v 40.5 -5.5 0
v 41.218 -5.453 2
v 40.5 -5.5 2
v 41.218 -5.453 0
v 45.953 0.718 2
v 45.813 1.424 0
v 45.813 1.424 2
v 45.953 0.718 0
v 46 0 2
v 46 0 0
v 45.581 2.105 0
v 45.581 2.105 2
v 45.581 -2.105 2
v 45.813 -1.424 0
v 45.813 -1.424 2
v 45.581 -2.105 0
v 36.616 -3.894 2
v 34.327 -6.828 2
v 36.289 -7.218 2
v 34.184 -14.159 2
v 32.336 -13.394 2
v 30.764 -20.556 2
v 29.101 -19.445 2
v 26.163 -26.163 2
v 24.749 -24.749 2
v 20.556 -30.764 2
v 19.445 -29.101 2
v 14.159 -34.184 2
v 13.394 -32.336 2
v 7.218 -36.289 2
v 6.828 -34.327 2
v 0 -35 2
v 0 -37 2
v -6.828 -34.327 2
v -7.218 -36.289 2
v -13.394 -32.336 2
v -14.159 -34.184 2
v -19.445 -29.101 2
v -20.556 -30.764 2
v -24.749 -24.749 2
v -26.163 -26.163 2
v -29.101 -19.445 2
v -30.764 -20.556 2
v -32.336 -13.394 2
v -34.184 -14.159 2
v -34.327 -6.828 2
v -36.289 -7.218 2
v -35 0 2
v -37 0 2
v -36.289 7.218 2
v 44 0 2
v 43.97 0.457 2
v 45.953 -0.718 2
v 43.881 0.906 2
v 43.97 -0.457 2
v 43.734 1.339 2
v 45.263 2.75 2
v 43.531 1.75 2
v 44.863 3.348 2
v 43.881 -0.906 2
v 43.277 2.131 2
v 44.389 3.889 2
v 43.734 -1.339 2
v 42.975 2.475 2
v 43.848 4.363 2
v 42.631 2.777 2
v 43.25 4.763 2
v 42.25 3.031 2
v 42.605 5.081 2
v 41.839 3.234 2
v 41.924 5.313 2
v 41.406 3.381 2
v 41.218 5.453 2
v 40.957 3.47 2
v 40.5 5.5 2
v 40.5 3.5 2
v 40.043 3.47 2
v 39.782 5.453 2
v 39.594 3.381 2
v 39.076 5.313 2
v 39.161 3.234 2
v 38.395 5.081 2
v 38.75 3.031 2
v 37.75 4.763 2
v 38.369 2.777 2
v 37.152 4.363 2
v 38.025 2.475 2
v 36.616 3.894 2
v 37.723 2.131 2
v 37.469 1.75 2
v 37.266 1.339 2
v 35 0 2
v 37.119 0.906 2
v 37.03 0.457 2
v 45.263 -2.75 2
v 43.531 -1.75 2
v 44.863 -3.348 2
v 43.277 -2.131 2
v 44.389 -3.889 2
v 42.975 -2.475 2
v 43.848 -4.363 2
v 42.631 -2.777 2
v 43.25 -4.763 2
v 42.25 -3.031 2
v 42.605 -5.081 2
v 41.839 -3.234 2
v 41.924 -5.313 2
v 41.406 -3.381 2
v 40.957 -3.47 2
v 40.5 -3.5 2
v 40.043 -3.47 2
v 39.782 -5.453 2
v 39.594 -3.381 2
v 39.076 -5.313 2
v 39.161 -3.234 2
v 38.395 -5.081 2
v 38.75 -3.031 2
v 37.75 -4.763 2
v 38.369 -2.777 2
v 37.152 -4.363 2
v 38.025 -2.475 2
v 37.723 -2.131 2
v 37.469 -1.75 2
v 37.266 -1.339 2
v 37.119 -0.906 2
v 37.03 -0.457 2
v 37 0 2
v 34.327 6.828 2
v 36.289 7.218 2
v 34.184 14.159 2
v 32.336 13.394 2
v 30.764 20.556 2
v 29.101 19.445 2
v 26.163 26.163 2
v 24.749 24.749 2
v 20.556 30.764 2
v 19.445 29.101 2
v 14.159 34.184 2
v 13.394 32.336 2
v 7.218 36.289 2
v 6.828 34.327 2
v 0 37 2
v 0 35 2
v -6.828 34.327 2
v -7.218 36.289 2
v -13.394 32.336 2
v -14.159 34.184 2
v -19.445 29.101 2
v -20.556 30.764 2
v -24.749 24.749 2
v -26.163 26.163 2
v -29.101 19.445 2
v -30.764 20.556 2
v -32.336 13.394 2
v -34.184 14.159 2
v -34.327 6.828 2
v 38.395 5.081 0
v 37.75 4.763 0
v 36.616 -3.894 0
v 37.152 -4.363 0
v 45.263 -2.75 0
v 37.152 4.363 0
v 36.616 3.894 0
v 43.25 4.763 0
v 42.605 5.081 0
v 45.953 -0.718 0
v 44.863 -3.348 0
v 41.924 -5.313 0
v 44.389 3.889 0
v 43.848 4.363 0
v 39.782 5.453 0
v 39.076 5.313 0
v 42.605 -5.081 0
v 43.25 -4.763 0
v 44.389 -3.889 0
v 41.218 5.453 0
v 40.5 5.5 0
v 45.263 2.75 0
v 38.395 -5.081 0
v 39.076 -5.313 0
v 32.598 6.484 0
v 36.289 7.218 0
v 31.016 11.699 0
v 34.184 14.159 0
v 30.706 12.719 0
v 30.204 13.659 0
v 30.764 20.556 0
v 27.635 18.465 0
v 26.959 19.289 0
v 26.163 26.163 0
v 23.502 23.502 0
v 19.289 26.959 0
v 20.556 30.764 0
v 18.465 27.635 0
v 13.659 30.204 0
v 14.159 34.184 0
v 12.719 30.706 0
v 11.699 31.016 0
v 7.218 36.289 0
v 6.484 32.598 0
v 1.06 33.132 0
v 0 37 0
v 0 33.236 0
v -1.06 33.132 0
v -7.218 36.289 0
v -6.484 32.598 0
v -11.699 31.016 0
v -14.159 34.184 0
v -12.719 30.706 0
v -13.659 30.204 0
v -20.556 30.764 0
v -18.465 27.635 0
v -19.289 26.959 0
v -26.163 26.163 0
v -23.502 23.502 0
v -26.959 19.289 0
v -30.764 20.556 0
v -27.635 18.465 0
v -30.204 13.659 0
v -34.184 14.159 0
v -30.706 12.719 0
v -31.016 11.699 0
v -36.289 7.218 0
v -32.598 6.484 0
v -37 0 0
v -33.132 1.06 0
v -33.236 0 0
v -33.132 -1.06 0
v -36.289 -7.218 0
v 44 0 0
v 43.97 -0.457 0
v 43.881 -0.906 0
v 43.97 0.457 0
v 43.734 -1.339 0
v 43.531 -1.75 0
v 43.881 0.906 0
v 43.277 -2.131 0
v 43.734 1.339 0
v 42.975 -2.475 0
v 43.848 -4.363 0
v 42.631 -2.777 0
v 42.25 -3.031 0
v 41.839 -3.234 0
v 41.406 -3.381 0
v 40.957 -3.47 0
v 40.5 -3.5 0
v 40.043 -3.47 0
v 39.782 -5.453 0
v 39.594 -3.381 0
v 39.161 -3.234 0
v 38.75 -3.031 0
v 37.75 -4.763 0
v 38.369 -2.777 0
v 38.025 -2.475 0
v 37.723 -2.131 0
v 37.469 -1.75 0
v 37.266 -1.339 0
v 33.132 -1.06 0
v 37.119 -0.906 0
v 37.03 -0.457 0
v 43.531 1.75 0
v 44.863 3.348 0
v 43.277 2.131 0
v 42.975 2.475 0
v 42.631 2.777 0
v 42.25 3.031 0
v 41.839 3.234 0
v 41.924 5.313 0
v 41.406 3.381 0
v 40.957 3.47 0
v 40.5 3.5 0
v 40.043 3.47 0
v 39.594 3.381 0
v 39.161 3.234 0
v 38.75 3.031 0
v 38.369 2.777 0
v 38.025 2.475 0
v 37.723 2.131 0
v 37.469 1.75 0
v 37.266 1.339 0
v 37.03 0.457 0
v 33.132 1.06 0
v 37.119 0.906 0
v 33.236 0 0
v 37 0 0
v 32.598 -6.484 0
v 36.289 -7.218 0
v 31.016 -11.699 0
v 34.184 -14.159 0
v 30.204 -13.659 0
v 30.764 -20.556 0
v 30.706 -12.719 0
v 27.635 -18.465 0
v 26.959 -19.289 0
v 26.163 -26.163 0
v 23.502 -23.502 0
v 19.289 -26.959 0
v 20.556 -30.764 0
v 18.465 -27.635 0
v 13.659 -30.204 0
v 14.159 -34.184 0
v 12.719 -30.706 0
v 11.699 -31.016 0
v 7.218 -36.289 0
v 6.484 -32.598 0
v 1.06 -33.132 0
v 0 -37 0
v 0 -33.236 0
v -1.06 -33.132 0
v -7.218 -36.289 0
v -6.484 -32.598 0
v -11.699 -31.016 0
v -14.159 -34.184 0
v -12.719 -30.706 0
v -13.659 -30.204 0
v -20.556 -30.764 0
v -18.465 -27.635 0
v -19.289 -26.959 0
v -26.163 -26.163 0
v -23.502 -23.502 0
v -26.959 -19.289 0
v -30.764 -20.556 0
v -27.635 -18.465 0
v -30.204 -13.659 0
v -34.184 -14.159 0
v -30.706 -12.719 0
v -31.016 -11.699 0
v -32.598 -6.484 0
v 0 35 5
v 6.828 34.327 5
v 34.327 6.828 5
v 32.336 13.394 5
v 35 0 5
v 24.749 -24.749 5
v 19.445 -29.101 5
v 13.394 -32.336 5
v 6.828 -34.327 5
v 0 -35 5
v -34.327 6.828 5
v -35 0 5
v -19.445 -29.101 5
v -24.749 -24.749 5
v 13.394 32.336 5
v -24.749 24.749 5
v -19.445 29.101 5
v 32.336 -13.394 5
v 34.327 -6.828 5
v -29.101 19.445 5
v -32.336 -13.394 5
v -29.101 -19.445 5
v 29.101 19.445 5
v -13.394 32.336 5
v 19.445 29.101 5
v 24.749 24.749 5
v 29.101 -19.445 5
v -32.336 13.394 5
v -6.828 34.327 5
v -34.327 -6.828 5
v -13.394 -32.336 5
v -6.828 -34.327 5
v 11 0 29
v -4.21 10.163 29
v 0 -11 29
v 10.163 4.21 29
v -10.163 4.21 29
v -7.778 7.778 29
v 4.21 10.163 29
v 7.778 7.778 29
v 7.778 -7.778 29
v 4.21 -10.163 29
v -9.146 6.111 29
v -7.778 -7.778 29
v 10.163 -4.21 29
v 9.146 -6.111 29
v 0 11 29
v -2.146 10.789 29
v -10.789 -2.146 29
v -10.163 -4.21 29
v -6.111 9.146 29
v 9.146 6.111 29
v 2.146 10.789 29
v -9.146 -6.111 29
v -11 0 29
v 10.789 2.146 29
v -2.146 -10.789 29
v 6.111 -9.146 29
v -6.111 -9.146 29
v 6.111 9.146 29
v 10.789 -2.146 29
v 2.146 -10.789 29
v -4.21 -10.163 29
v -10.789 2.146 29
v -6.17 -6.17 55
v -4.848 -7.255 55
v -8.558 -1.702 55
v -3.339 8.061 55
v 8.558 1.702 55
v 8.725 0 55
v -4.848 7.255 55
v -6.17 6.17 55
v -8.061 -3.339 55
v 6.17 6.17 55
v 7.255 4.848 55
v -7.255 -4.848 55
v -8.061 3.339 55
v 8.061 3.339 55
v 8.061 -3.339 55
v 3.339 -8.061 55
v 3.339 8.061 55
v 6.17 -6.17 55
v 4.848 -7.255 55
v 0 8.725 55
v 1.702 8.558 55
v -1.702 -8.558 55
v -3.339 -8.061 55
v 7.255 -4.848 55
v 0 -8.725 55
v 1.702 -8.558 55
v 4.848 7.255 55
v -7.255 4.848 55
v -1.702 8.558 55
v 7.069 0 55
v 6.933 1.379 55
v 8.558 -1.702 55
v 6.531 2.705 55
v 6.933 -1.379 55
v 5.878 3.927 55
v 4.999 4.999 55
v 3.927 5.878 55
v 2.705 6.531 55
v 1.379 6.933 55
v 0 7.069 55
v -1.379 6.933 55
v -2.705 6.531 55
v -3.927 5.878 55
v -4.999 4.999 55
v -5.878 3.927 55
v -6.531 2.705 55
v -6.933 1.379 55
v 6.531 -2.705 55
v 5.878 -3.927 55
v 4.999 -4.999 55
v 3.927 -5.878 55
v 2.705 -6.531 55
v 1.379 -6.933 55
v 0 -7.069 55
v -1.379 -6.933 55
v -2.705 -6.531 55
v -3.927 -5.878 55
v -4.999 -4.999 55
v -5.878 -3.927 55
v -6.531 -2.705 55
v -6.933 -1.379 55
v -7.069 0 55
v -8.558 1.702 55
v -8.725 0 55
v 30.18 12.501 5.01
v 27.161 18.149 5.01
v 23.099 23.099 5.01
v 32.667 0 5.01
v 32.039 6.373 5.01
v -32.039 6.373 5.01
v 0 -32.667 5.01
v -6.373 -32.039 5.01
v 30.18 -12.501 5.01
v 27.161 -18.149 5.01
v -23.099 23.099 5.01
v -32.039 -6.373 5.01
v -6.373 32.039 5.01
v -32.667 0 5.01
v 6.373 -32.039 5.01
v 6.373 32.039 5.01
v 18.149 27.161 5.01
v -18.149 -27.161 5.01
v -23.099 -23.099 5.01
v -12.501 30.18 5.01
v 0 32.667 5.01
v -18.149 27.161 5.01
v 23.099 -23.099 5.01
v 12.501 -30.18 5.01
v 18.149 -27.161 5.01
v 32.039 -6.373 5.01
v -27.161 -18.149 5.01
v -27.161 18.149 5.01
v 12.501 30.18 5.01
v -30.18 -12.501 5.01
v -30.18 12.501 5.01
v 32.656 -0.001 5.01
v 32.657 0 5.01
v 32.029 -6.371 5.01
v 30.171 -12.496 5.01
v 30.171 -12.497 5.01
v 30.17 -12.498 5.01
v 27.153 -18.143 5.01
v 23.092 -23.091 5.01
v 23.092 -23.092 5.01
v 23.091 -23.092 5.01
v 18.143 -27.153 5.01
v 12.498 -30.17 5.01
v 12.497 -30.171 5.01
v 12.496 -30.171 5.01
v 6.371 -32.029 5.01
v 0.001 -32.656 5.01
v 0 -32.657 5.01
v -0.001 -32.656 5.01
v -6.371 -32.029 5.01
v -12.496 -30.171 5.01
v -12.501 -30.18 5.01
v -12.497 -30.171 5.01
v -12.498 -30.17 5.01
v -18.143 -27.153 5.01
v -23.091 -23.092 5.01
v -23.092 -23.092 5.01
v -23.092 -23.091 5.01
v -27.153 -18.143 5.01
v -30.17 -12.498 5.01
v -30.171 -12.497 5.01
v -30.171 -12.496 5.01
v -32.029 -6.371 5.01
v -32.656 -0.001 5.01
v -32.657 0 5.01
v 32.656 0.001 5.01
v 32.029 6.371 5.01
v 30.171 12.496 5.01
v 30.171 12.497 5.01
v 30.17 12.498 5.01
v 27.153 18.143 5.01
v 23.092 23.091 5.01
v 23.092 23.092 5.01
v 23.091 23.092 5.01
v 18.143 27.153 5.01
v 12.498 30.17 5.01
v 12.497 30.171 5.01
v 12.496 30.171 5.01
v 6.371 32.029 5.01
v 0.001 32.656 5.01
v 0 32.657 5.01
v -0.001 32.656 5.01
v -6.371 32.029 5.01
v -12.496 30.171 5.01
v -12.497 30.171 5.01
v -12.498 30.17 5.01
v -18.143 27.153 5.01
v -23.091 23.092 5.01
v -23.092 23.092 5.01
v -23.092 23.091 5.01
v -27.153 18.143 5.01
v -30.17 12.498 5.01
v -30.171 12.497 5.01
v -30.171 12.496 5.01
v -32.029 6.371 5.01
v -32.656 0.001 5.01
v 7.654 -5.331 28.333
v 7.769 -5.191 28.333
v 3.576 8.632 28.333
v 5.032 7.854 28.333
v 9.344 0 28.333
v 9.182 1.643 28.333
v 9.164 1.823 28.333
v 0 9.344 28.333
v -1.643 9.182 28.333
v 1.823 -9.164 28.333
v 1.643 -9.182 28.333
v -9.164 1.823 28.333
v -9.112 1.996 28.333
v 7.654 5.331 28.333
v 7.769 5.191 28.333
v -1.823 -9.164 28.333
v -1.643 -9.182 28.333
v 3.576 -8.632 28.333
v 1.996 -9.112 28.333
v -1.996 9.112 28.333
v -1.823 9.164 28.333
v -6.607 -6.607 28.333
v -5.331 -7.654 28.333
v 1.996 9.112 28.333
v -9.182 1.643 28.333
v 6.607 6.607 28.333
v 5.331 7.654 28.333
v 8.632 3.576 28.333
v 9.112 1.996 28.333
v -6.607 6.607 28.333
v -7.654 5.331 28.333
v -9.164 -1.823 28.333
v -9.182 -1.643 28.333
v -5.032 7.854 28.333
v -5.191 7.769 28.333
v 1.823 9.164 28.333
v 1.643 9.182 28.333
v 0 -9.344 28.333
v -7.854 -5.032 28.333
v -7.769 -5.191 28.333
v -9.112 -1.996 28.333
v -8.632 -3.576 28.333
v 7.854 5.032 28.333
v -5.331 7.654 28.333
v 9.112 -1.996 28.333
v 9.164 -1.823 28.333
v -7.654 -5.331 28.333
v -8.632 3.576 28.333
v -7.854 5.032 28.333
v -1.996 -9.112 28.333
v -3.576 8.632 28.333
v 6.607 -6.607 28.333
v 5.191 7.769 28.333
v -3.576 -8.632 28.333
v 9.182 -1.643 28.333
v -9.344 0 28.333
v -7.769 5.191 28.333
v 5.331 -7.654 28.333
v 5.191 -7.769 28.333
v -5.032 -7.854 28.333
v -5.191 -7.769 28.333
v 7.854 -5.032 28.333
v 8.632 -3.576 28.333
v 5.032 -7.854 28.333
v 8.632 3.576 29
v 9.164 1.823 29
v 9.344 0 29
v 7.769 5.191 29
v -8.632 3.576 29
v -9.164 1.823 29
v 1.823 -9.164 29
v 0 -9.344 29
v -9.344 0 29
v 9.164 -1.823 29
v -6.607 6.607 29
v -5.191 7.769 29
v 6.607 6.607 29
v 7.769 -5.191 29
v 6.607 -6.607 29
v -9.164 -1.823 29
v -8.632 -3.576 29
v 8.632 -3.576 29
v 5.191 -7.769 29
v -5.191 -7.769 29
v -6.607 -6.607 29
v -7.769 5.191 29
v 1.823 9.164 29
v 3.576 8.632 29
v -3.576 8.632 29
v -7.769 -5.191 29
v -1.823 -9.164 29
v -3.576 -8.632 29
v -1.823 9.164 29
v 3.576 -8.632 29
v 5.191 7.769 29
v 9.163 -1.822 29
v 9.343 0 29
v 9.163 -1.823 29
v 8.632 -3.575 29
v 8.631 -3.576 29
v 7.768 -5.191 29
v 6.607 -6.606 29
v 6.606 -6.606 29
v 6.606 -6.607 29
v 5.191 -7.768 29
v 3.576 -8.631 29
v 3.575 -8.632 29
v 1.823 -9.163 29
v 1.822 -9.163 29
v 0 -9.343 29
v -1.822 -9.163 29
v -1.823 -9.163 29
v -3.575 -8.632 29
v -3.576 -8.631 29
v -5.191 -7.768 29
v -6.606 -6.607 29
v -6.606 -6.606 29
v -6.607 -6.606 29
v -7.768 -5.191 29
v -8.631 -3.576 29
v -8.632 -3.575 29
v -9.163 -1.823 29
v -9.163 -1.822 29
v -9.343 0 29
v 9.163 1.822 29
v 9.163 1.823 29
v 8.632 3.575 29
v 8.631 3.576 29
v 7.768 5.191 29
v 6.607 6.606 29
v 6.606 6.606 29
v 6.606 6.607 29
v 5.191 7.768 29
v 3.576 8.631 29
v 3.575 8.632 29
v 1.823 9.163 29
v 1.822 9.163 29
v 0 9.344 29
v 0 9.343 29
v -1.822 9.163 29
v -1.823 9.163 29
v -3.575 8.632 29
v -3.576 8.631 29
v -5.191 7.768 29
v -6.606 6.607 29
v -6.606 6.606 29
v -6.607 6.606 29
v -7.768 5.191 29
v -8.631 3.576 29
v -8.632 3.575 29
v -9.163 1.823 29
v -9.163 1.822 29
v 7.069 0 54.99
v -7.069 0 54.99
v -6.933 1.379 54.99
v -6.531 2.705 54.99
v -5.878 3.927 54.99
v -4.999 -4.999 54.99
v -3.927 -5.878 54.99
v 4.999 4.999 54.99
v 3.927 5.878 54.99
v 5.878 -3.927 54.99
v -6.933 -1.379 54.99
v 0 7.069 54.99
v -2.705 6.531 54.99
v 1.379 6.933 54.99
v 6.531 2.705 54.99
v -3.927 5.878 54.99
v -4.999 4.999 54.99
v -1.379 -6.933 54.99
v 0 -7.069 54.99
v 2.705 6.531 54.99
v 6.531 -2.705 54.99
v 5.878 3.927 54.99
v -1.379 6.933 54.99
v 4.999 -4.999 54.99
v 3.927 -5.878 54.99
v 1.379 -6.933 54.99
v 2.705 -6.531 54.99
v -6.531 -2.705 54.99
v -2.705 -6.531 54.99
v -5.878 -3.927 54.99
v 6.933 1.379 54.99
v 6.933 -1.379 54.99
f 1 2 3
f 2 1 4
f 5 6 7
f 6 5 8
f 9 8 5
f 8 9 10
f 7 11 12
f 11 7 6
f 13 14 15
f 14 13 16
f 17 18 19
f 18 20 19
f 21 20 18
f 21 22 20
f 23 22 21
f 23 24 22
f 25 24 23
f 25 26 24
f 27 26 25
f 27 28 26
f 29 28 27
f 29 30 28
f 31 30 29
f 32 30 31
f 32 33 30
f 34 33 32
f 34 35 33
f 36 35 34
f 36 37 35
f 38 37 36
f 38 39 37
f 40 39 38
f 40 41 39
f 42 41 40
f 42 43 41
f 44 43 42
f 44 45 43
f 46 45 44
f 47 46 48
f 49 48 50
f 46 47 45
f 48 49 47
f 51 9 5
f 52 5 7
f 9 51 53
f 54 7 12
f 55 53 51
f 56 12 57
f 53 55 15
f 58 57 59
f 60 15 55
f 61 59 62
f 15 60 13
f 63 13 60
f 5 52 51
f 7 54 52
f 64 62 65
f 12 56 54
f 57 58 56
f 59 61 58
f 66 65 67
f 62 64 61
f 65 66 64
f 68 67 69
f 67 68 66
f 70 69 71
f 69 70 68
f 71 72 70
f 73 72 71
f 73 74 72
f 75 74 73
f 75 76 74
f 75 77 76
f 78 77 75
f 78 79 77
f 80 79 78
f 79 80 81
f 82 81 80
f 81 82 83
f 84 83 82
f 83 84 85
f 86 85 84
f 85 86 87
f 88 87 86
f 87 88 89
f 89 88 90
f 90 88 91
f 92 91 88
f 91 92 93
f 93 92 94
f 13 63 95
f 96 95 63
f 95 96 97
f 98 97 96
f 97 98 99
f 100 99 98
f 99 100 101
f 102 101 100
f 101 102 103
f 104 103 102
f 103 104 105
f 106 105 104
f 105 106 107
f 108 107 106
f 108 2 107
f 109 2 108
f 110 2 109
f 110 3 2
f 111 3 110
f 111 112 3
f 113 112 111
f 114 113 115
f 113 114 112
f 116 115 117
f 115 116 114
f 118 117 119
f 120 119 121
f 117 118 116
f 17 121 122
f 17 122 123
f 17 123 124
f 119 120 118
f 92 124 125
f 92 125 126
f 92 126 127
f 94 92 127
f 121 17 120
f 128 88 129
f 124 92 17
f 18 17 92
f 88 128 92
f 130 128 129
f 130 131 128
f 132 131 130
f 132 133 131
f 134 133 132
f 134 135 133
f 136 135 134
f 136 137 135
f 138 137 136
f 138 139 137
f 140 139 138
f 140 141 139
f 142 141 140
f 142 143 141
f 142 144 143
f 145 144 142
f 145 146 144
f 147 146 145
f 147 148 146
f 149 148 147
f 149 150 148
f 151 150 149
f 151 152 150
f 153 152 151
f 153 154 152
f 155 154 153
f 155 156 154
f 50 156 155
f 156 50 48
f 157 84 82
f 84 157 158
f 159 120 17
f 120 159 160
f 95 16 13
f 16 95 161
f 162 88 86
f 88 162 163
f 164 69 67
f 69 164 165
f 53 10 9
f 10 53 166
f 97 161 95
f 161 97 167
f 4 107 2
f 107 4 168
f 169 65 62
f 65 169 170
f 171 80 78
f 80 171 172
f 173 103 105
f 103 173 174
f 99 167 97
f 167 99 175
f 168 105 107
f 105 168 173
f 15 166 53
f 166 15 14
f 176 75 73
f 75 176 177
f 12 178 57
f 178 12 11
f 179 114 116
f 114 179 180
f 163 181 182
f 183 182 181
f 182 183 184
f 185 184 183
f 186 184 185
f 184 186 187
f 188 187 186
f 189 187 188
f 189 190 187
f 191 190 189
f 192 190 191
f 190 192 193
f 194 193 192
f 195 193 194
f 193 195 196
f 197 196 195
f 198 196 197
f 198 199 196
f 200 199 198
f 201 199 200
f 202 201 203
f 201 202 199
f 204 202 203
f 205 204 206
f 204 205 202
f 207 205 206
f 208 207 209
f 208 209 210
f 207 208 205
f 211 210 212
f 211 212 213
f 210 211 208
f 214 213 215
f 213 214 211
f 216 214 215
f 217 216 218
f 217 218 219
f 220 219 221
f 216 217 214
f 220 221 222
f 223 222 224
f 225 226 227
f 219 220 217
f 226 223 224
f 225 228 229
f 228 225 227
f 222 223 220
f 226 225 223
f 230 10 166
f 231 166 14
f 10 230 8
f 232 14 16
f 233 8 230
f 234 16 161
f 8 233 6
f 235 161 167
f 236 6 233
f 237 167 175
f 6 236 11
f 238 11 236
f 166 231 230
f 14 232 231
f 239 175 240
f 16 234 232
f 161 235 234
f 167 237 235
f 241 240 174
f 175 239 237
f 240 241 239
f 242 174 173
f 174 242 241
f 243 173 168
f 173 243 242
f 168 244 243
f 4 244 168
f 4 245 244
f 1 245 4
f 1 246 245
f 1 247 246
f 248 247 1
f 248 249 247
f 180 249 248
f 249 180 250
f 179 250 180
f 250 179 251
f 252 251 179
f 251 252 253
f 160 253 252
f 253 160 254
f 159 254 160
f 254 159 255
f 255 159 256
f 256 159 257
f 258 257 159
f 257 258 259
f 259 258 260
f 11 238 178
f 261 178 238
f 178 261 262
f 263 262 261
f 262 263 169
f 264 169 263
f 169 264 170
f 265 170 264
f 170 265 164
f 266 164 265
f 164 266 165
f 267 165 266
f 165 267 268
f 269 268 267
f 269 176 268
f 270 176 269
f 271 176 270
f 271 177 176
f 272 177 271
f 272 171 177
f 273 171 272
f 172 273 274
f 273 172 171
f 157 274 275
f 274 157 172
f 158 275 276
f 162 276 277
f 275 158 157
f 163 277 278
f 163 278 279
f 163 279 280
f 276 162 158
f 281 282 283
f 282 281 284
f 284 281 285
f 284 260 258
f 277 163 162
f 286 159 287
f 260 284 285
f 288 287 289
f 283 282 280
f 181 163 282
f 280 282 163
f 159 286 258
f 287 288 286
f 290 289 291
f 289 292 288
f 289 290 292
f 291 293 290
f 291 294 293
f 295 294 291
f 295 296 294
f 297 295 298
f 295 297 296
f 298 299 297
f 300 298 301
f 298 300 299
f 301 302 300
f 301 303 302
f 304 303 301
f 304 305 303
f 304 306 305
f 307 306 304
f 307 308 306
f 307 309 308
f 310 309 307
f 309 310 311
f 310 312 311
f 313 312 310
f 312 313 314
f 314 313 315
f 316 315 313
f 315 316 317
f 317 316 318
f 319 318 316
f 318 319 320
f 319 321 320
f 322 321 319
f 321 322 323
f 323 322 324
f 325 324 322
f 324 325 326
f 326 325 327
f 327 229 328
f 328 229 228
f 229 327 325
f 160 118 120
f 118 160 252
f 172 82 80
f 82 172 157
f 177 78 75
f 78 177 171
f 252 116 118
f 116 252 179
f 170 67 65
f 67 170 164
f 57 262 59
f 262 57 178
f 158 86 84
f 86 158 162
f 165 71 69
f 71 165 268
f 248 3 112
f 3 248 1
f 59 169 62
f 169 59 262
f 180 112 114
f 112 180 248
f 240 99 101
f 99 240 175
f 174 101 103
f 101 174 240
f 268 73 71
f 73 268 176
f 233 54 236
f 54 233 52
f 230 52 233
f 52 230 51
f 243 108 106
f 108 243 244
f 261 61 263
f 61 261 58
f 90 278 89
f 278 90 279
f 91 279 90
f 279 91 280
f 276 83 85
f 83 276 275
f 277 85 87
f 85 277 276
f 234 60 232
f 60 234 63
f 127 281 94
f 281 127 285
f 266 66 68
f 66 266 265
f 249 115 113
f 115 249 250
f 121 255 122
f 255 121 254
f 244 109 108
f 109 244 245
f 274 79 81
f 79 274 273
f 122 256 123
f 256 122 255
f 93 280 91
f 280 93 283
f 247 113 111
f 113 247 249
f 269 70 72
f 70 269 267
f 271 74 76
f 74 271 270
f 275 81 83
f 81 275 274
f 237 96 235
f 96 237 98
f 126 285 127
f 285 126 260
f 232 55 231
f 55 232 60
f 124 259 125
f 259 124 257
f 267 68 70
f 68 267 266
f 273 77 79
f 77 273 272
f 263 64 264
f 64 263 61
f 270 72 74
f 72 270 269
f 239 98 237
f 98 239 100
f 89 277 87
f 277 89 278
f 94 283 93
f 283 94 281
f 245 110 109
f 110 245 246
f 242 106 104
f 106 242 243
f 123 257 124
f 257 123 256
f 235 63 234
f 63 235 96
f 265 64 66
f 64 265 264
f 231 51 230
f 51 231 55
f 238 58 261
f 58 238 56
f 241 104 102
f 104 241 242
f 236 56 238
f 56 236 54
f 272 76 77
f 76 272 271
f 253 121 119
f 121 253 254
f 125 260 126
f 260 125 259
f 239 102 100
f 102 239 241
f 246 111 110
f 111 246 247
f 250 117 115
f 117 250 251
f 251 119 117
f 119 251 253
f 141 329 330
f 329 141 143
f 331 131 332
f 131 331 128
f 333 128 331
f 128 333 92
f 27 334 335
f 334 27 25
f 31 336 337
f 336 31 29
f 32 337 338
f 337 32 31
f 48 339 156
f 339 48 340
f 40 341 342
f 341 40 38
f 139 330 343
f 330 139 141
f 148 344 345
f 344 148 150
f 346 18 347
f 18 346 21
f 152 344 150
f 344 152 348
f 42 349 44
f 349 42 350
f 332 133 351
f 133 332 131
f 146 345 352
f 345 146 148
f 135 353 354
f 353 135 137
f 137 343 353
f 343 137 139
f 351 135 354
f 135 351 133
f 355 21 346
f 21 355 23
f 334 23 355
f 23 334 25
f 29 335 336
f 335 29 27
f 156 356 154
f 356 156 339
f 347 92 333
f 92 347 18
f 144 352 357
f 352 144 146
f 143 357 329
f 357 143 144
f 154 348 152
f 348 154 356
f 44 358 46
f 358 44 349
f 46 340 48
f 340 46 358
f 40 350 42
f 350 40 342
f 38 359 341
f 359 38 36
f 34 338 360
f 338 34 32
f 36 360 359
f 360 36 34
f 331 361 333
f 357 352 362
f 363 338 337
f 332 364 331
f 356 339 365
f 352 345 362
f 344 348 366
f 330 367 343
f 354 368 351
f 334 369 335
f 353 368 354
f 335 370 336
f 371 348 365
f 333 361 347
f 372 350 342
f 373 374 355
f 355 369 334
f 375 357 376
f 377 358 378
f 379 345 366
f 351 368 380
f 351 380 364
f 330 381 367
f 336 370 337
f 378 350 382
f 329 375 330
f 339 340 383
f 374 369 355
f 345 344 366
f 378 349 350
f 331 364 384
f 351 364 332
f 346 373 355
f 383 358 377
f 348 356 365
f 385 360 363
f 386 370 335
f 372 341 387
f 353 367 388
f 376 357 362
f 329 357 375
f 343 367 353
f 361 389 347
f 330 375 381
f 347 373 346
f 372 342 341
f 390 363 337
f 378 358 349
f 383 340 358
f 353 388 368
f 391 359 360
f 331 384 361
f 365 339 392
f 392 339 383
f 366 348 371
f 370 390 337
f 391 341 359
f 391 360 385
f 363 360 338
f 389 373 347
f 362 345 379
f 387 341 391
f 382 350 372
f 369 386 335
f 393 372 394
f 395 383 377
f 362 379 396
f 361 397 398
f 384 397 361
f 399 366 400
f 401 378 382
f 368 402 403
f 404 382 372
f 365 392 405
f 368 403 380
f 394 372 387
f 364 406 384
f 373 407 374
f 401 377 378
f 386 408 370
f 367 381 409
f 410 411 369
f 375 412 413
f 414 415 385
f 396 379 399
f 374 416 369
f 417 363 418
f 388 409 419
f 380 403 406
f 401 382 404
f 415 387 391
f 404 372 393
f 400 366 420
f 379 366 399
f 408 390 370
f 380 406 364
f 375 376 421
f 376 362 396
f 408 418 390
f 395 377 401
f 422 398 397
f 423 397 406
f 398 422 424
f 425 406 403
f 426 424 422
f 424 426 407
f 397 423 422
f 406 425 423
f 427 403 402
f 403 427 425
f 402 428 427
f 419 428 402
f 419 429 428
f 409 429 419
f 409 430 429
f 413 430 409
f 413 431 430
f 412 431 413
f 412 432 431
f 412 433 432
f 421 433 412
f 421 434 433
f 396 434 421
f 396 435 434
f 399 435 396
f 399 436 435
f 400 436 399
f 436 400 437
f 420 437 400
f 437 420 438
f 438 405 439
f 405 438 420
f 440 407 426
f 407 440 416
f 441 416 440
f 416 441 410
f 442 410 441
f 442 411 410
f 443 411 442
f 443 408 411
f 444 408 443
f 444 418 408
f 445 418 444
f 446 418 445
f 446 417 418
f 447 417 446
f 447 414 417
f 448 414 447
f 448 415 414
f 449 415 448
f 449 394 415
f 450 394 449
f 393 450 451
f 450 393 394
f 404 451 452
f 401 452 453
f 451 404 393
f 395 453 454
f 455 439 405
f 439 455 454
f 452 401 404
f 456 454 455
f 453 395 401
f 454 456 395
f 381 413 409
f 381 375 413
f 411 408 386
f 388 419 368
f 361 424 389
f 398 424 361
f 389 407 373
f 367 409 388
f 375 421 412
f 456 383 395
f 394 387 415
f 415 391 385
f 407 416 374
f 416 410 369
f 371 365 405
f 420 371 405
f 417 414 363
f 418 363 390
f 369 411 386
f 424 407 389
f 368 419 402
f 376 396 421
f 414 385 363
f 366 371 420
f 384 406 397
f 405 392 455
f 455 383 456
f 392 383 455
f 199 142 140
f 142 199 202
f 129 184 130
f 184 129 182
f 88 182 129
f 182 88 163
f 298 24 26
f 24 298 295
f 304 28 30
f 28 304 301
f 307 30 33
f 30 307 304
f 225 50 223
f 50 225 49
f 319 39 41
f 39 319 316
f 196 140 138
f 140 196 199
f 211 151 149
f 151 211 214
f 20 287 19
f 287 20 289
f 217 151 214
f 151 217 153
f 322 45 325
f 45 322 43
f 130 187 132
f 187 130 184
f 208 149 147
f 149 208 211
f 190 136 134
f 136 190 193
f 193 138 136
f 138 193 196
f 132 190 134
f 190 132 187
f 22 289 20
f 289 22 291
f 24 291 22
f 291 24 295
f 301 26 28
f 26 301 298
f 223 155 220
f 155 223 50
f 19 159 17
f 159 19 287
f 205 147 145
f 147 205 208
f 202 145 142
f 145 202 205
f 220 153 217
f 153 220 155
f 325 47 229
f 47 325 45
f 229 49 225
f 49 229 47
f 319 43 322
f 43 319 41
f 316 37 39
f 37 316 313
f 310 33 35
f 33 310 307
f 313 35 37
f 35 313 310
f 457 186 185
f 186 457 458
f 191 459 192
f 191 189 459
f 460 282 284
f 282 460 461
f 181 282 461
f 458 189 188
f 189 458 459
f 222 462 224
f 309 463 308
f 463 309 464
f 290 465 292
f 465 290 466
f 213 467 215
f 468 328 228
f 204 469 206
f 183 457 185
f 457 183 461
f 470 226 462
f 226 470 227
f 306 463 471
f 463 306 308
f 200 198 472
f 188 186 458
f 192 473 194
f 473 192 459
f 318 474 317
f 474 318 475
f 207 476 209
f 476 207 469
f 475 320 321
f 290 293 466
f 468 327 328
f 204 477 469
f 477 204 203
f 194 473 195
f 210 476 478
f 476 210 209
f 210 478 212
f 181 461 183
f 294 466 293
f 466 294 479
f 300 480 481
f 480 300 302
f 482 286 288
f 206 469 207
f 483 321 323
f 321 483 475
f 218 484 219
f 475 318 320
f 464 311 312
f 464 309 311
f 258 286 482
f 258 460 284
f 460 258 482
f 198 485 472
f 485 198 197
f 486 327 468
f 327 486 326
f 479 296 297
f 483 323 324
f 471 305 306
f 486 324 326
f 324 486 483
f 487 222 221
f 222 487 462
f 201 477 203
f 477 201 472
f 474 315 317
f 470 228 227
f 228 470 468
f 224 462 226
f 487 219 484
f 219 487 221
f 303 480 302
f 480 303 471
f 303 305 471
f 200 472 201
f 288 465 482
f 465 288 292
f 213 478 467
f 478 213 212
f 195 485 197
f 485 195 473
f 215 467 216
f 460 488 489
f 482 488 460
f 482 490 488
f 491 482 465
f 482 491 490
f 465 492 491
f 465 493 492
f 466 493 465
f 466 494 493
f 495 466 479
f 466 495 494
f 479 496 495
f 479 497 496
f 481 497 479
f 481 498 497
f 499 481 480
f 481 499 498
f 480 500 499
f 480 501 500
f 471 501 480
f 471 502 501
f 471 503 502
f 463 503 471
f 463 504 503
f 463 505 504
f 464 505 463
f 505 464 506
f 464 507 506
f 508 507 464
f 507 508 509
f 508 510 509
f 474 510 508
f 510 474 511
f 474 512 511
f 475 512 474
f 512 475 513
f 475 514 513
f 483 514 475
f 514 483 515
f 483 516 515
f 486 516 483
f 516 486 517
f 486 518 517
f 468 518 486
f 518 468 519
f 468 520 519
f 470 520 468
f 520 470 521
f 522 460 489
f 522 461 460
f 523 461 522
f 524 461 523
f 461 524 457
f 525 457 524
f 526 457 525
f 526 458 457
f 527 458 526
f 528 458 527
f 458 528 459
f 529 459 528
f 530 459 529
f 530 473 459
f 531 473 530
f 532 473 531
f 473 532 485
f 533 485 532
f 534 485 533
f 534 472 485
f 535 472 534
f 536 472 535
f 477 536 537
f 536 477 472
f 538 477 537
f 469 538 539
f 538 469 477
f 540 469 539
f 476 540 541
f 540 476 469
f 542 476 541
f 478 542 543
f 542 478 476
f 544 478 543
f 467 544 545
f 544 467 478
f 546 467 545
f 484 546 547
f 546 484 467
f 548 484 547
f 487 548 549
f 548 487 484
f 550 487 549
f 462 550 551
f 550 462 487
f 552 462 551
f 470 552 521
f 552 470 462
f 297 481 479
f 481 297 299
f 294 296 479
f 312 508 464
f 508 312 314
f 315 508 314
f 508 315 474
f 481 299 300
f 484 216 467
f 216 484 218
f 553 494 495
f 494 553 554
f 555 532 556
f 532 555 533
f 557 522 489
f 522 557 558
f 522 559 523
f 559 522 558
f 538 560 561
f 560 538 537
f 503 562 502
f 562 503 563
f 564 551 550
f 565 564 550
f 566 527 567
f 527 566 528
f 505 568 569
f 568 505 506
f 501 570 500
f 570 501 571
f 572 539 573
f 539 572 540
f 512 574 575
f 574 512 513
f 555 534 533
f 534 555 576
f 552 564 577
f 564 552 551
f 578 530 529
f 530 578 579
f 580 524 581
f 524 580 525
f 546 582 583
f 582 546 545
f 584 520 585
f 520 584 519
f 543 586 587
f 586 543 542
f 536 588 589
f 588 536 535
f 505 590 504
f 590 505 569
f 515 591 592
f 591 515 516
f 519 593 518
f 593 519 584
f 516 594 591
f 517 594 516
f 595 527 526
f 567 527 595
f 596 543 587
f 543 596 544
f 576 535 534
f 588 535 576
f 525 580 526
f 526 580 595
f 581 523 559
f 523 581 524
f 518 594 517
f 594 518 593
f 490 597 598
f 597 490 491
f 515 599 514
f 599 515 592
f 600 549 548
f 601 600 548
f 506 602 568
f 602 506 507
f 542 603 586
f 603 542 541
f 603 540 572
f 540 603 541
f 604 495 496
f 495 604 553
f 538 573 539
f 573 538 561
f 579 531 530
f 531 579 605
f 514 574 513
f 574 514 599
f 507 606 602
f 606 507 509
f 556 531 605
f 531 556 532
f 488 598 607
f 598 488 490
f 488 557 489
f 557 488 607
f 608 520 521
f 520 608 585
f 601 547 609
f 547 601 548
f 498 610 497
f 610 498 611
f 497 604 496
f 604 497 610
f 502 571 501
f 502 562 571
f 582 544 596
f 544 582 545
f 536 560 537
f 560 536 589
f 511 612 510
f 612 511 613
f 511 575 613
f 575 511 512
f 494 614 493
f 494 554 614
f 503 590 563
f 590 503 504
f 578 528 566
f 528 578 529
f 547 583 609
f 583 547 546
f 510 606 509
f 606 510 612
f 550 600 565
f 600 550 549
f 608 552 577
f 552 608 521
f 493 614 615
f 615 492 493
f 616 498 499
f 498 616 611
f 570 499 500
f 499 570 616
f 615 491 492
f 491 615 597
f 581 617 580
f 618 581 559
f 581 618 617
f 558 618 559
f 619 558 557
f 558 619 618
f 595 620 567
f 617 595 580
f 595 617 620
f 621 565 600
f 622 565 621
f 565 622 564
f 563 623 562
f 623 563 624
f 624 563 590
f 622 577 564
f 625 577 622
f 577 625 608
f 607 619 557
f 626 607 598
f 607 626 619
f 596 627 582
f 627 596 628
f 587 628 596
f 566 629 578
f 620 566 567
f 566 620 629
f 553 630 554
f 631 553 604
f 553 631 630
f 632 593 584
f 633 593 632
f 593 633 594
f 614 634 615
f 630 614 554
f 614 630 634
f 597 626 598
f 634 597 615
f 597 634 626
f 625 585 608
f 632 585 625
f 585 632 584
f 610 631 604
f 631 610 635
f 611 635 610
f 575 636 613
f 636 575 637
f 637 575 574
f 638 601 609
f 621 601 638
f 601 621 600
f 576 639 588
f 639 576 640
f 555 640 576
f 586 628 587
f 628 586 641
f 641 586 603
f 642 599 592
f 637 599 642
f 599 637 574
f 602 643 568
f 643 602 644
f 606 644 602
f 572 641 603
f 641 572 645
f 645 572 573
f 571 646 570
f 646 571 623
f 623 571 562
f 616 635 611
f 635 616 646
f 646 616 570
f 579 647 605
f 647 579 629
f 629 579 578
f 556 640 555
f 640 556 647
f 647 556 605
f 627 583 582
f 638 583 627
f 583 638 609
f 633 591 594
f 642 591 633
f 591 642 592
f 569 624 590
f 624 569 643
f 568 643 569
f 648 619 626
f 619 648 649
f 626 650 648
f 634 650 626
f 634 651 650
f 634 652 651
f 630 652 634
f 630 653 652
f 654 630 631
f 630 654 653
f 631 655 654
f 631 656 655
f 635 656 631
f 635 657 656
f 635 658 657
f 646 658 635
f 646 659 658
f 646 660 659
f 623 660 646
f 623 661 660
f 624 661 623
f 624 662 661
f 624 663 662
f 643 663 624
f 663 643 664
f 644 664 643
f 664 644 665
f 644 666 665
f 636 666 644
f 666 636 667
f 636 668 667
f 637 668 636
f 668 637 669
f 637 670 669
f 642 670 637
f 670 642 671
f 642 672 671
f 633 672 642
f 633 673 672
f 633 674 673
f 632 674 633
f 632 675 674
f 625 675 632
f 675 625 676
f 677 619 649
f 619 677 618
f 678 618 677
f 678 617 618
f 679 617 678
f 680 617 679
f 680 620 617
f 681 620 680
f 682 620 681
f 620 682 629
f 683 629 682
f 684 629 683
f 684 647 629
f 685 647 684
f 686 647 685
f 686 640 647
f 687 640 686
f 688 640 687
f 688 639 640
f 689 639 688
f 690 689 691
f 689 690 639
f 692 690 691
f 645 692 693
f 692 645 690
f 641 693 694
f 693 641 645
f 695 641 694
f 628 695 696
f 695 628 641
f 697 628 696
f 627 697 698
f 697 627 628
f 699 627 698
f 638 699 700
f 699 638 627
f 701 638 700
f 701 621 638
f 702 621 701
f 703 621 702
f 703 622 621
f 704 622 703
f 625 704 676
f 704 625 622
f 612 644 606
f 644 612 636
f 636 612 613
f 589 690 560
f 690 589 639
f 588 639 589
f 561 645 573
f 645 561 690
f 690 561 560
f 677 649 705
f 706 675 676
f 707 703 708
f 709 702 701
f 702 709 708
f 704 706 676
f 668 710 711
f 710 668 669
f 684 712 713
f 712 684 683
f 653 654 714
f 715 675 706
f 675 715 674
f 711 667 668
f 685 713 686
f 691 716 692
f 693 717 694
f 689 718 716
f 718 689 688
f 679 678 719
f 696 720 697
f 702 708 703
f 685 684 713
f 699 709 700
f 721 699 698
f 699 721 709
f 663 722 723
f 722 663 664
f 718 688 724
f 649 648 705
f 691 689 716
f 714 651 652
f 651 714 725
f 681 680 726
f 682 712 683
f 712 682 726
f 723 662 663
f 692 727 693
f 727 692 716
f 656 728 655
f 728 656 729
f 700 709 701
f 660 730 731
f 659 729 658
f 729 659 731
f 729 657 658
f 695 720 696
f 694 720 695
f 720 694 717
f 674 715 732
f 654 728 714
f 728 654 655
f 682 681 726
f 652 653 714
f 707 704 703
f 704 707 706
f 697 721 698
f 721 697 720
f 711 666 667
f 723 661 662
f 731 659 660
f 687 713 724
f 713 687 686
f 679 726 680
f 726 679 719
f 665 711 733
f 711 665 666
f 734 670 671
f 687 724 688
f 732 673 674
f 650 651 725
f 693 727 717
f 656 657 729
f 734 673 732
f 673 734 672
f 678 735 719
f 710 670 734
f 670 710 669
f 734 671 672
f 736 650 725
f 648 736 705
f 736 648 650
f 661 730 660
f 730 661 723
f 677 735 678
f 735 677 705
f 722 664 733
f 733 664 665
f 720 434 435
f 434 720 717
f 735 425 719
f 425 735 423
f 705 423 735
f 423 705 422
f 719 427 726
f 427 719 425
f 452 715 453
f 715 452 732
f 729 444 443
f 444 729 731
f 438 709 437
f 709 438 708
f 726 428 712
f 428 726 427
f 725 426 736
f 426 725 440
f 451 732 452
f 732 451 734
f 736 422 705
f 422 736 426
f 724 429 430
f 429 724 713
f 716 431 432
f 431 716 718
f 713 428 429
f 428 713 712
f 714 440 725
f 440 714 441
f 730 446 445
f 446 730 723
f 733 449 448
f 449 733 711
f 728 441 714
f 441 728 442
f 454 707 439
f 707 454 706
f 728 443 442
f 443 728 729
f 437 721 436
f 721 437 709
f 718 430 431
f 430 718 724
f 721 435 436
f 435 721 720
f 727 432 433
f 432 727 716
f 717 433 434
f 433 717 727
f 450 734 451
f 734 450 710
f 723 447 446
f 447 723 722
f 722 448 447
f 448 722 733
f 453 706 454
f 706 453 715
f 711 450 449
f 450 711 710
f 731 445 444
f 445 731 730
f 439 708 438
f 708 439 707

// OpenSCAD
//Customizable Funnel
//8/31/2016     By: David Bunch
//
//1. Outside Diameter of Big Part of Funnel
Big_OD = 70;    //[12:1:200]

//2. Height of Big Part of Funnel before Flare
Big_Ht = 5;     //[0:1:50]

//3. Thickness of Funnel
Thk = 1.65;         //[1:.1:5]

//4. Flare Angle of Big Part of Funnel
Big_Ang = 45;   //[30:1:80]

//5. Outside Diameter of Small Part of Funnel
Small_OD = 22;    //[6:1:100]

//6. Height of Small Part of Funnel
Small_Ht = 26;     //[6:1:50]

//7. Small Flared Angle (75 to 90 degress)
Small_Ang = 85;   //[75:1:90]

//8. Resolution of Funnel 
Ires = 32;           //[4:2:72]

//9. Draw Eyelet to hang Funnel from (yes, or no)
Draw_Eye = "yes";  //[yes,no]

//10. Outside Diameter of Eyelet
Eye_OD = 11;       //[7:1:20]

//11. Inside Diameter of Eyelet
Eye_ID = 7;        //[1:1:18]

//12. Height of Eyelet Hanger
Eye_Ht = 2;        //[.1:.1:3]

//13. How Thick to draw a Lip around Print Base of Funnel
Lip_Thk = 2;        //[0:.5:20]

//14. How High is the Lip
Lip_Ht = 2;         //[.5:.5:6]

/* [Hidden] */

Small_Thk = Thk;       //Thickness at Bottom smaller part can be different from Top
                                        //Generally the same as Thk, but you can change it
Lip_OD = Big_OD + (2 * Lip_Thk);        //Diameter including the Lip Width
Lip_Rad = Lip_OD / 2;                   //Radius of Lip
Big_OD1 = Big_OD - (Thk * 2);       //Only used if Big_Ht > 0
Big_Rad = Big_OD / 2;               //Radius of Top Part of Funnel
Small_Rad = Small_OD / 2;           //Radius of Bottom Part of Funnel
Small_ID = Small_OD - (Small_Thk * 2);    //Inside Diameter of Smallest part of Funnel
Fun_TopHt = (Big_Rad - Small_Rad) * tan(Big_Ang);     //Height of Funnel Top to Center Line
Fun_Thk = Thk / sin(Big_Ang);       //Funnel Thickness based on Angle used
                                    //Need this to calculate actual Inside Diameters of flared part
Fun_Top_ID = Big_OD - (Fun_Thk * 2);        //Inside Diameter of Big part of Funnel
Fun_Top_ID1 = Small_OD - (Fun_Thk * 2);
Bot_Fun_90Ang = 90 - Small_Ang;             //Need smaller Angle
Bot_Fun_Thk = Small_Thk / cos(Bot_Fun_90Ang);
Bot_Fun_ID = Small_OD - (Bot_Fun_Thk * 2);      //Lower flared portion of Funnel Inside Diameter

Tot_Ht = Fun_TopHt + Small_Ht + Big_Ht;     //Total Height of Funnel
//            cylinder(d1=Fun_Top_ID,d2=Bot_Fun_ID,h=Fun_TopHt+.01);
Bot_Flare_Dist = Small_Ht * tan(Bot_Fun_90Ang);
Bot_Fun_OD1 = Small_OD - (Bot_Flare_Dist * 2);
Bot_Fun_ID1 = Bot_Fun_OD1 - (2 * Bot_Fun_Thk);

echo(Bot_Fun_Thk = Bot_Fun_Thk);
echo(Fun_TopHt = Fun_TopHt);
echo(Fun_Thk = Fun_Thk);
echo(Fun_Top_ID = Fun_Top_ID);

echo(Tot_Ht = Tot_Ht);
echo(Bot_Fun_90Ang = Bot_Fun_90Ang);
echo(Bot_Flare_Dist = Bot_Flare_Dist);
echo(Bot_Fun_OD1 = Bot_Fun_OD1);
echo(Bot_Fun_ID = Bot_Fun_ID);
echo(Bot_Fun_ID1 = Bot_Fun_ID1);
Big_OD_Res = (round(((Big_OD * 3.14)/4) / 1.0)*4);  //about 1.0mm segments
Eye_OD_Res = (round(((Eye_OD * 3.14)/4) / .7)*4);
echo(Big_OD_Res = Big_OD_Res);
$fn=Ires;               //Set Resolution so we do not need to add it to cylinder()'s
//$fn = Big_OD_Res;       //If you prefer about 1mm resolution on segments, uncomment this

module DrawFunnel()
{
    difference()
    {
        union()
        {
            if (Big_Ht > 0)
            {
                cylinder(d=Big_OD,h=Big_Ht);
            }
//Flared Outside Big part of Funnel
            translate([0,0,Big_Ht])
            cylinder(d1=Big_OD,d2=Small_OD,h=Fun_TopHt);
//Flared or Straight Small part of Funnel
            translate([0,0,Fun_TopHt+Big_Ht])
            cylinder(d1=Small_OD,d2=Bot_Fun_OD1,h=Small_Ht);     
            if (Draw_Eye == "yes")
            {
                translate([(Lip_Rad + (Eye_ID/2)),0,0])
                difference()
                {
                    cylinder(d=Eye_OD,h=Eye_Ht,$fn=Eye_OD_Res);
                    translate([0,0,-1])
                    cylinder(d=Eye_ID,h=Eye_Ht+2,$fn=Eye_OD_Res);
                }
            }
//See if we need to draw a lip around the Funnel
            if (Lip_Thk > 0)
            {
                cylinder(d=Lip_OD,h=Lip_Ht);
            }
        }
        if (Big_Ht > 0)
        {
            translate([0,0,-1])
            cylinder(d1=Big_OD1,d2=Fun_Top_ID,h=Big_Ht+1.01);
            translate([0,0,Big_Ht])
            cylinder(d1=Fun_Top_ID,d2=Fun_Top_ID1,h=Fun_TopHt+.01);
        } else
        {
            translate([0,0,Big_Ht-.01])
            cylinder(d1=Fun_Top_ID,d2=Bot_Fun_ID,h=Fun_TopHt+.01);
        }
        if (Small_Ang > 0)
        {
            translate([0,0,Big_Ht+Fun_TopHt-10])
            cylinder(d=Bot_Fun_ID,h=10);     //Flared cut small part of Funnel
            translate([0,0,Big_Ht+Fun_TopHt-.01])
            cylinder(d1=Bot_Fun_ID,d2=Bot_Fun_ID1,h=Small_Ht);     //Flared cut small part of Funnel
            translate([0,0,-1])
            cylinder(d=Bot_Fun_ID1,h=Tot_Ht+2);
        } else
        {
            translate([0,0,-1])
            cylinder(d=Small_ID,h=Tot_Ht+2);
        }
//        translate([-Big_OD,0,-1])
//        cube([Big_OD*2,Big_OD,Tot_Ht+2]);       //Cross section to see Thickness width
    }
}
DrawFunnel();
//%cylinder(d=Big_OD,h=Tot_Ht);     //Check Total Height
